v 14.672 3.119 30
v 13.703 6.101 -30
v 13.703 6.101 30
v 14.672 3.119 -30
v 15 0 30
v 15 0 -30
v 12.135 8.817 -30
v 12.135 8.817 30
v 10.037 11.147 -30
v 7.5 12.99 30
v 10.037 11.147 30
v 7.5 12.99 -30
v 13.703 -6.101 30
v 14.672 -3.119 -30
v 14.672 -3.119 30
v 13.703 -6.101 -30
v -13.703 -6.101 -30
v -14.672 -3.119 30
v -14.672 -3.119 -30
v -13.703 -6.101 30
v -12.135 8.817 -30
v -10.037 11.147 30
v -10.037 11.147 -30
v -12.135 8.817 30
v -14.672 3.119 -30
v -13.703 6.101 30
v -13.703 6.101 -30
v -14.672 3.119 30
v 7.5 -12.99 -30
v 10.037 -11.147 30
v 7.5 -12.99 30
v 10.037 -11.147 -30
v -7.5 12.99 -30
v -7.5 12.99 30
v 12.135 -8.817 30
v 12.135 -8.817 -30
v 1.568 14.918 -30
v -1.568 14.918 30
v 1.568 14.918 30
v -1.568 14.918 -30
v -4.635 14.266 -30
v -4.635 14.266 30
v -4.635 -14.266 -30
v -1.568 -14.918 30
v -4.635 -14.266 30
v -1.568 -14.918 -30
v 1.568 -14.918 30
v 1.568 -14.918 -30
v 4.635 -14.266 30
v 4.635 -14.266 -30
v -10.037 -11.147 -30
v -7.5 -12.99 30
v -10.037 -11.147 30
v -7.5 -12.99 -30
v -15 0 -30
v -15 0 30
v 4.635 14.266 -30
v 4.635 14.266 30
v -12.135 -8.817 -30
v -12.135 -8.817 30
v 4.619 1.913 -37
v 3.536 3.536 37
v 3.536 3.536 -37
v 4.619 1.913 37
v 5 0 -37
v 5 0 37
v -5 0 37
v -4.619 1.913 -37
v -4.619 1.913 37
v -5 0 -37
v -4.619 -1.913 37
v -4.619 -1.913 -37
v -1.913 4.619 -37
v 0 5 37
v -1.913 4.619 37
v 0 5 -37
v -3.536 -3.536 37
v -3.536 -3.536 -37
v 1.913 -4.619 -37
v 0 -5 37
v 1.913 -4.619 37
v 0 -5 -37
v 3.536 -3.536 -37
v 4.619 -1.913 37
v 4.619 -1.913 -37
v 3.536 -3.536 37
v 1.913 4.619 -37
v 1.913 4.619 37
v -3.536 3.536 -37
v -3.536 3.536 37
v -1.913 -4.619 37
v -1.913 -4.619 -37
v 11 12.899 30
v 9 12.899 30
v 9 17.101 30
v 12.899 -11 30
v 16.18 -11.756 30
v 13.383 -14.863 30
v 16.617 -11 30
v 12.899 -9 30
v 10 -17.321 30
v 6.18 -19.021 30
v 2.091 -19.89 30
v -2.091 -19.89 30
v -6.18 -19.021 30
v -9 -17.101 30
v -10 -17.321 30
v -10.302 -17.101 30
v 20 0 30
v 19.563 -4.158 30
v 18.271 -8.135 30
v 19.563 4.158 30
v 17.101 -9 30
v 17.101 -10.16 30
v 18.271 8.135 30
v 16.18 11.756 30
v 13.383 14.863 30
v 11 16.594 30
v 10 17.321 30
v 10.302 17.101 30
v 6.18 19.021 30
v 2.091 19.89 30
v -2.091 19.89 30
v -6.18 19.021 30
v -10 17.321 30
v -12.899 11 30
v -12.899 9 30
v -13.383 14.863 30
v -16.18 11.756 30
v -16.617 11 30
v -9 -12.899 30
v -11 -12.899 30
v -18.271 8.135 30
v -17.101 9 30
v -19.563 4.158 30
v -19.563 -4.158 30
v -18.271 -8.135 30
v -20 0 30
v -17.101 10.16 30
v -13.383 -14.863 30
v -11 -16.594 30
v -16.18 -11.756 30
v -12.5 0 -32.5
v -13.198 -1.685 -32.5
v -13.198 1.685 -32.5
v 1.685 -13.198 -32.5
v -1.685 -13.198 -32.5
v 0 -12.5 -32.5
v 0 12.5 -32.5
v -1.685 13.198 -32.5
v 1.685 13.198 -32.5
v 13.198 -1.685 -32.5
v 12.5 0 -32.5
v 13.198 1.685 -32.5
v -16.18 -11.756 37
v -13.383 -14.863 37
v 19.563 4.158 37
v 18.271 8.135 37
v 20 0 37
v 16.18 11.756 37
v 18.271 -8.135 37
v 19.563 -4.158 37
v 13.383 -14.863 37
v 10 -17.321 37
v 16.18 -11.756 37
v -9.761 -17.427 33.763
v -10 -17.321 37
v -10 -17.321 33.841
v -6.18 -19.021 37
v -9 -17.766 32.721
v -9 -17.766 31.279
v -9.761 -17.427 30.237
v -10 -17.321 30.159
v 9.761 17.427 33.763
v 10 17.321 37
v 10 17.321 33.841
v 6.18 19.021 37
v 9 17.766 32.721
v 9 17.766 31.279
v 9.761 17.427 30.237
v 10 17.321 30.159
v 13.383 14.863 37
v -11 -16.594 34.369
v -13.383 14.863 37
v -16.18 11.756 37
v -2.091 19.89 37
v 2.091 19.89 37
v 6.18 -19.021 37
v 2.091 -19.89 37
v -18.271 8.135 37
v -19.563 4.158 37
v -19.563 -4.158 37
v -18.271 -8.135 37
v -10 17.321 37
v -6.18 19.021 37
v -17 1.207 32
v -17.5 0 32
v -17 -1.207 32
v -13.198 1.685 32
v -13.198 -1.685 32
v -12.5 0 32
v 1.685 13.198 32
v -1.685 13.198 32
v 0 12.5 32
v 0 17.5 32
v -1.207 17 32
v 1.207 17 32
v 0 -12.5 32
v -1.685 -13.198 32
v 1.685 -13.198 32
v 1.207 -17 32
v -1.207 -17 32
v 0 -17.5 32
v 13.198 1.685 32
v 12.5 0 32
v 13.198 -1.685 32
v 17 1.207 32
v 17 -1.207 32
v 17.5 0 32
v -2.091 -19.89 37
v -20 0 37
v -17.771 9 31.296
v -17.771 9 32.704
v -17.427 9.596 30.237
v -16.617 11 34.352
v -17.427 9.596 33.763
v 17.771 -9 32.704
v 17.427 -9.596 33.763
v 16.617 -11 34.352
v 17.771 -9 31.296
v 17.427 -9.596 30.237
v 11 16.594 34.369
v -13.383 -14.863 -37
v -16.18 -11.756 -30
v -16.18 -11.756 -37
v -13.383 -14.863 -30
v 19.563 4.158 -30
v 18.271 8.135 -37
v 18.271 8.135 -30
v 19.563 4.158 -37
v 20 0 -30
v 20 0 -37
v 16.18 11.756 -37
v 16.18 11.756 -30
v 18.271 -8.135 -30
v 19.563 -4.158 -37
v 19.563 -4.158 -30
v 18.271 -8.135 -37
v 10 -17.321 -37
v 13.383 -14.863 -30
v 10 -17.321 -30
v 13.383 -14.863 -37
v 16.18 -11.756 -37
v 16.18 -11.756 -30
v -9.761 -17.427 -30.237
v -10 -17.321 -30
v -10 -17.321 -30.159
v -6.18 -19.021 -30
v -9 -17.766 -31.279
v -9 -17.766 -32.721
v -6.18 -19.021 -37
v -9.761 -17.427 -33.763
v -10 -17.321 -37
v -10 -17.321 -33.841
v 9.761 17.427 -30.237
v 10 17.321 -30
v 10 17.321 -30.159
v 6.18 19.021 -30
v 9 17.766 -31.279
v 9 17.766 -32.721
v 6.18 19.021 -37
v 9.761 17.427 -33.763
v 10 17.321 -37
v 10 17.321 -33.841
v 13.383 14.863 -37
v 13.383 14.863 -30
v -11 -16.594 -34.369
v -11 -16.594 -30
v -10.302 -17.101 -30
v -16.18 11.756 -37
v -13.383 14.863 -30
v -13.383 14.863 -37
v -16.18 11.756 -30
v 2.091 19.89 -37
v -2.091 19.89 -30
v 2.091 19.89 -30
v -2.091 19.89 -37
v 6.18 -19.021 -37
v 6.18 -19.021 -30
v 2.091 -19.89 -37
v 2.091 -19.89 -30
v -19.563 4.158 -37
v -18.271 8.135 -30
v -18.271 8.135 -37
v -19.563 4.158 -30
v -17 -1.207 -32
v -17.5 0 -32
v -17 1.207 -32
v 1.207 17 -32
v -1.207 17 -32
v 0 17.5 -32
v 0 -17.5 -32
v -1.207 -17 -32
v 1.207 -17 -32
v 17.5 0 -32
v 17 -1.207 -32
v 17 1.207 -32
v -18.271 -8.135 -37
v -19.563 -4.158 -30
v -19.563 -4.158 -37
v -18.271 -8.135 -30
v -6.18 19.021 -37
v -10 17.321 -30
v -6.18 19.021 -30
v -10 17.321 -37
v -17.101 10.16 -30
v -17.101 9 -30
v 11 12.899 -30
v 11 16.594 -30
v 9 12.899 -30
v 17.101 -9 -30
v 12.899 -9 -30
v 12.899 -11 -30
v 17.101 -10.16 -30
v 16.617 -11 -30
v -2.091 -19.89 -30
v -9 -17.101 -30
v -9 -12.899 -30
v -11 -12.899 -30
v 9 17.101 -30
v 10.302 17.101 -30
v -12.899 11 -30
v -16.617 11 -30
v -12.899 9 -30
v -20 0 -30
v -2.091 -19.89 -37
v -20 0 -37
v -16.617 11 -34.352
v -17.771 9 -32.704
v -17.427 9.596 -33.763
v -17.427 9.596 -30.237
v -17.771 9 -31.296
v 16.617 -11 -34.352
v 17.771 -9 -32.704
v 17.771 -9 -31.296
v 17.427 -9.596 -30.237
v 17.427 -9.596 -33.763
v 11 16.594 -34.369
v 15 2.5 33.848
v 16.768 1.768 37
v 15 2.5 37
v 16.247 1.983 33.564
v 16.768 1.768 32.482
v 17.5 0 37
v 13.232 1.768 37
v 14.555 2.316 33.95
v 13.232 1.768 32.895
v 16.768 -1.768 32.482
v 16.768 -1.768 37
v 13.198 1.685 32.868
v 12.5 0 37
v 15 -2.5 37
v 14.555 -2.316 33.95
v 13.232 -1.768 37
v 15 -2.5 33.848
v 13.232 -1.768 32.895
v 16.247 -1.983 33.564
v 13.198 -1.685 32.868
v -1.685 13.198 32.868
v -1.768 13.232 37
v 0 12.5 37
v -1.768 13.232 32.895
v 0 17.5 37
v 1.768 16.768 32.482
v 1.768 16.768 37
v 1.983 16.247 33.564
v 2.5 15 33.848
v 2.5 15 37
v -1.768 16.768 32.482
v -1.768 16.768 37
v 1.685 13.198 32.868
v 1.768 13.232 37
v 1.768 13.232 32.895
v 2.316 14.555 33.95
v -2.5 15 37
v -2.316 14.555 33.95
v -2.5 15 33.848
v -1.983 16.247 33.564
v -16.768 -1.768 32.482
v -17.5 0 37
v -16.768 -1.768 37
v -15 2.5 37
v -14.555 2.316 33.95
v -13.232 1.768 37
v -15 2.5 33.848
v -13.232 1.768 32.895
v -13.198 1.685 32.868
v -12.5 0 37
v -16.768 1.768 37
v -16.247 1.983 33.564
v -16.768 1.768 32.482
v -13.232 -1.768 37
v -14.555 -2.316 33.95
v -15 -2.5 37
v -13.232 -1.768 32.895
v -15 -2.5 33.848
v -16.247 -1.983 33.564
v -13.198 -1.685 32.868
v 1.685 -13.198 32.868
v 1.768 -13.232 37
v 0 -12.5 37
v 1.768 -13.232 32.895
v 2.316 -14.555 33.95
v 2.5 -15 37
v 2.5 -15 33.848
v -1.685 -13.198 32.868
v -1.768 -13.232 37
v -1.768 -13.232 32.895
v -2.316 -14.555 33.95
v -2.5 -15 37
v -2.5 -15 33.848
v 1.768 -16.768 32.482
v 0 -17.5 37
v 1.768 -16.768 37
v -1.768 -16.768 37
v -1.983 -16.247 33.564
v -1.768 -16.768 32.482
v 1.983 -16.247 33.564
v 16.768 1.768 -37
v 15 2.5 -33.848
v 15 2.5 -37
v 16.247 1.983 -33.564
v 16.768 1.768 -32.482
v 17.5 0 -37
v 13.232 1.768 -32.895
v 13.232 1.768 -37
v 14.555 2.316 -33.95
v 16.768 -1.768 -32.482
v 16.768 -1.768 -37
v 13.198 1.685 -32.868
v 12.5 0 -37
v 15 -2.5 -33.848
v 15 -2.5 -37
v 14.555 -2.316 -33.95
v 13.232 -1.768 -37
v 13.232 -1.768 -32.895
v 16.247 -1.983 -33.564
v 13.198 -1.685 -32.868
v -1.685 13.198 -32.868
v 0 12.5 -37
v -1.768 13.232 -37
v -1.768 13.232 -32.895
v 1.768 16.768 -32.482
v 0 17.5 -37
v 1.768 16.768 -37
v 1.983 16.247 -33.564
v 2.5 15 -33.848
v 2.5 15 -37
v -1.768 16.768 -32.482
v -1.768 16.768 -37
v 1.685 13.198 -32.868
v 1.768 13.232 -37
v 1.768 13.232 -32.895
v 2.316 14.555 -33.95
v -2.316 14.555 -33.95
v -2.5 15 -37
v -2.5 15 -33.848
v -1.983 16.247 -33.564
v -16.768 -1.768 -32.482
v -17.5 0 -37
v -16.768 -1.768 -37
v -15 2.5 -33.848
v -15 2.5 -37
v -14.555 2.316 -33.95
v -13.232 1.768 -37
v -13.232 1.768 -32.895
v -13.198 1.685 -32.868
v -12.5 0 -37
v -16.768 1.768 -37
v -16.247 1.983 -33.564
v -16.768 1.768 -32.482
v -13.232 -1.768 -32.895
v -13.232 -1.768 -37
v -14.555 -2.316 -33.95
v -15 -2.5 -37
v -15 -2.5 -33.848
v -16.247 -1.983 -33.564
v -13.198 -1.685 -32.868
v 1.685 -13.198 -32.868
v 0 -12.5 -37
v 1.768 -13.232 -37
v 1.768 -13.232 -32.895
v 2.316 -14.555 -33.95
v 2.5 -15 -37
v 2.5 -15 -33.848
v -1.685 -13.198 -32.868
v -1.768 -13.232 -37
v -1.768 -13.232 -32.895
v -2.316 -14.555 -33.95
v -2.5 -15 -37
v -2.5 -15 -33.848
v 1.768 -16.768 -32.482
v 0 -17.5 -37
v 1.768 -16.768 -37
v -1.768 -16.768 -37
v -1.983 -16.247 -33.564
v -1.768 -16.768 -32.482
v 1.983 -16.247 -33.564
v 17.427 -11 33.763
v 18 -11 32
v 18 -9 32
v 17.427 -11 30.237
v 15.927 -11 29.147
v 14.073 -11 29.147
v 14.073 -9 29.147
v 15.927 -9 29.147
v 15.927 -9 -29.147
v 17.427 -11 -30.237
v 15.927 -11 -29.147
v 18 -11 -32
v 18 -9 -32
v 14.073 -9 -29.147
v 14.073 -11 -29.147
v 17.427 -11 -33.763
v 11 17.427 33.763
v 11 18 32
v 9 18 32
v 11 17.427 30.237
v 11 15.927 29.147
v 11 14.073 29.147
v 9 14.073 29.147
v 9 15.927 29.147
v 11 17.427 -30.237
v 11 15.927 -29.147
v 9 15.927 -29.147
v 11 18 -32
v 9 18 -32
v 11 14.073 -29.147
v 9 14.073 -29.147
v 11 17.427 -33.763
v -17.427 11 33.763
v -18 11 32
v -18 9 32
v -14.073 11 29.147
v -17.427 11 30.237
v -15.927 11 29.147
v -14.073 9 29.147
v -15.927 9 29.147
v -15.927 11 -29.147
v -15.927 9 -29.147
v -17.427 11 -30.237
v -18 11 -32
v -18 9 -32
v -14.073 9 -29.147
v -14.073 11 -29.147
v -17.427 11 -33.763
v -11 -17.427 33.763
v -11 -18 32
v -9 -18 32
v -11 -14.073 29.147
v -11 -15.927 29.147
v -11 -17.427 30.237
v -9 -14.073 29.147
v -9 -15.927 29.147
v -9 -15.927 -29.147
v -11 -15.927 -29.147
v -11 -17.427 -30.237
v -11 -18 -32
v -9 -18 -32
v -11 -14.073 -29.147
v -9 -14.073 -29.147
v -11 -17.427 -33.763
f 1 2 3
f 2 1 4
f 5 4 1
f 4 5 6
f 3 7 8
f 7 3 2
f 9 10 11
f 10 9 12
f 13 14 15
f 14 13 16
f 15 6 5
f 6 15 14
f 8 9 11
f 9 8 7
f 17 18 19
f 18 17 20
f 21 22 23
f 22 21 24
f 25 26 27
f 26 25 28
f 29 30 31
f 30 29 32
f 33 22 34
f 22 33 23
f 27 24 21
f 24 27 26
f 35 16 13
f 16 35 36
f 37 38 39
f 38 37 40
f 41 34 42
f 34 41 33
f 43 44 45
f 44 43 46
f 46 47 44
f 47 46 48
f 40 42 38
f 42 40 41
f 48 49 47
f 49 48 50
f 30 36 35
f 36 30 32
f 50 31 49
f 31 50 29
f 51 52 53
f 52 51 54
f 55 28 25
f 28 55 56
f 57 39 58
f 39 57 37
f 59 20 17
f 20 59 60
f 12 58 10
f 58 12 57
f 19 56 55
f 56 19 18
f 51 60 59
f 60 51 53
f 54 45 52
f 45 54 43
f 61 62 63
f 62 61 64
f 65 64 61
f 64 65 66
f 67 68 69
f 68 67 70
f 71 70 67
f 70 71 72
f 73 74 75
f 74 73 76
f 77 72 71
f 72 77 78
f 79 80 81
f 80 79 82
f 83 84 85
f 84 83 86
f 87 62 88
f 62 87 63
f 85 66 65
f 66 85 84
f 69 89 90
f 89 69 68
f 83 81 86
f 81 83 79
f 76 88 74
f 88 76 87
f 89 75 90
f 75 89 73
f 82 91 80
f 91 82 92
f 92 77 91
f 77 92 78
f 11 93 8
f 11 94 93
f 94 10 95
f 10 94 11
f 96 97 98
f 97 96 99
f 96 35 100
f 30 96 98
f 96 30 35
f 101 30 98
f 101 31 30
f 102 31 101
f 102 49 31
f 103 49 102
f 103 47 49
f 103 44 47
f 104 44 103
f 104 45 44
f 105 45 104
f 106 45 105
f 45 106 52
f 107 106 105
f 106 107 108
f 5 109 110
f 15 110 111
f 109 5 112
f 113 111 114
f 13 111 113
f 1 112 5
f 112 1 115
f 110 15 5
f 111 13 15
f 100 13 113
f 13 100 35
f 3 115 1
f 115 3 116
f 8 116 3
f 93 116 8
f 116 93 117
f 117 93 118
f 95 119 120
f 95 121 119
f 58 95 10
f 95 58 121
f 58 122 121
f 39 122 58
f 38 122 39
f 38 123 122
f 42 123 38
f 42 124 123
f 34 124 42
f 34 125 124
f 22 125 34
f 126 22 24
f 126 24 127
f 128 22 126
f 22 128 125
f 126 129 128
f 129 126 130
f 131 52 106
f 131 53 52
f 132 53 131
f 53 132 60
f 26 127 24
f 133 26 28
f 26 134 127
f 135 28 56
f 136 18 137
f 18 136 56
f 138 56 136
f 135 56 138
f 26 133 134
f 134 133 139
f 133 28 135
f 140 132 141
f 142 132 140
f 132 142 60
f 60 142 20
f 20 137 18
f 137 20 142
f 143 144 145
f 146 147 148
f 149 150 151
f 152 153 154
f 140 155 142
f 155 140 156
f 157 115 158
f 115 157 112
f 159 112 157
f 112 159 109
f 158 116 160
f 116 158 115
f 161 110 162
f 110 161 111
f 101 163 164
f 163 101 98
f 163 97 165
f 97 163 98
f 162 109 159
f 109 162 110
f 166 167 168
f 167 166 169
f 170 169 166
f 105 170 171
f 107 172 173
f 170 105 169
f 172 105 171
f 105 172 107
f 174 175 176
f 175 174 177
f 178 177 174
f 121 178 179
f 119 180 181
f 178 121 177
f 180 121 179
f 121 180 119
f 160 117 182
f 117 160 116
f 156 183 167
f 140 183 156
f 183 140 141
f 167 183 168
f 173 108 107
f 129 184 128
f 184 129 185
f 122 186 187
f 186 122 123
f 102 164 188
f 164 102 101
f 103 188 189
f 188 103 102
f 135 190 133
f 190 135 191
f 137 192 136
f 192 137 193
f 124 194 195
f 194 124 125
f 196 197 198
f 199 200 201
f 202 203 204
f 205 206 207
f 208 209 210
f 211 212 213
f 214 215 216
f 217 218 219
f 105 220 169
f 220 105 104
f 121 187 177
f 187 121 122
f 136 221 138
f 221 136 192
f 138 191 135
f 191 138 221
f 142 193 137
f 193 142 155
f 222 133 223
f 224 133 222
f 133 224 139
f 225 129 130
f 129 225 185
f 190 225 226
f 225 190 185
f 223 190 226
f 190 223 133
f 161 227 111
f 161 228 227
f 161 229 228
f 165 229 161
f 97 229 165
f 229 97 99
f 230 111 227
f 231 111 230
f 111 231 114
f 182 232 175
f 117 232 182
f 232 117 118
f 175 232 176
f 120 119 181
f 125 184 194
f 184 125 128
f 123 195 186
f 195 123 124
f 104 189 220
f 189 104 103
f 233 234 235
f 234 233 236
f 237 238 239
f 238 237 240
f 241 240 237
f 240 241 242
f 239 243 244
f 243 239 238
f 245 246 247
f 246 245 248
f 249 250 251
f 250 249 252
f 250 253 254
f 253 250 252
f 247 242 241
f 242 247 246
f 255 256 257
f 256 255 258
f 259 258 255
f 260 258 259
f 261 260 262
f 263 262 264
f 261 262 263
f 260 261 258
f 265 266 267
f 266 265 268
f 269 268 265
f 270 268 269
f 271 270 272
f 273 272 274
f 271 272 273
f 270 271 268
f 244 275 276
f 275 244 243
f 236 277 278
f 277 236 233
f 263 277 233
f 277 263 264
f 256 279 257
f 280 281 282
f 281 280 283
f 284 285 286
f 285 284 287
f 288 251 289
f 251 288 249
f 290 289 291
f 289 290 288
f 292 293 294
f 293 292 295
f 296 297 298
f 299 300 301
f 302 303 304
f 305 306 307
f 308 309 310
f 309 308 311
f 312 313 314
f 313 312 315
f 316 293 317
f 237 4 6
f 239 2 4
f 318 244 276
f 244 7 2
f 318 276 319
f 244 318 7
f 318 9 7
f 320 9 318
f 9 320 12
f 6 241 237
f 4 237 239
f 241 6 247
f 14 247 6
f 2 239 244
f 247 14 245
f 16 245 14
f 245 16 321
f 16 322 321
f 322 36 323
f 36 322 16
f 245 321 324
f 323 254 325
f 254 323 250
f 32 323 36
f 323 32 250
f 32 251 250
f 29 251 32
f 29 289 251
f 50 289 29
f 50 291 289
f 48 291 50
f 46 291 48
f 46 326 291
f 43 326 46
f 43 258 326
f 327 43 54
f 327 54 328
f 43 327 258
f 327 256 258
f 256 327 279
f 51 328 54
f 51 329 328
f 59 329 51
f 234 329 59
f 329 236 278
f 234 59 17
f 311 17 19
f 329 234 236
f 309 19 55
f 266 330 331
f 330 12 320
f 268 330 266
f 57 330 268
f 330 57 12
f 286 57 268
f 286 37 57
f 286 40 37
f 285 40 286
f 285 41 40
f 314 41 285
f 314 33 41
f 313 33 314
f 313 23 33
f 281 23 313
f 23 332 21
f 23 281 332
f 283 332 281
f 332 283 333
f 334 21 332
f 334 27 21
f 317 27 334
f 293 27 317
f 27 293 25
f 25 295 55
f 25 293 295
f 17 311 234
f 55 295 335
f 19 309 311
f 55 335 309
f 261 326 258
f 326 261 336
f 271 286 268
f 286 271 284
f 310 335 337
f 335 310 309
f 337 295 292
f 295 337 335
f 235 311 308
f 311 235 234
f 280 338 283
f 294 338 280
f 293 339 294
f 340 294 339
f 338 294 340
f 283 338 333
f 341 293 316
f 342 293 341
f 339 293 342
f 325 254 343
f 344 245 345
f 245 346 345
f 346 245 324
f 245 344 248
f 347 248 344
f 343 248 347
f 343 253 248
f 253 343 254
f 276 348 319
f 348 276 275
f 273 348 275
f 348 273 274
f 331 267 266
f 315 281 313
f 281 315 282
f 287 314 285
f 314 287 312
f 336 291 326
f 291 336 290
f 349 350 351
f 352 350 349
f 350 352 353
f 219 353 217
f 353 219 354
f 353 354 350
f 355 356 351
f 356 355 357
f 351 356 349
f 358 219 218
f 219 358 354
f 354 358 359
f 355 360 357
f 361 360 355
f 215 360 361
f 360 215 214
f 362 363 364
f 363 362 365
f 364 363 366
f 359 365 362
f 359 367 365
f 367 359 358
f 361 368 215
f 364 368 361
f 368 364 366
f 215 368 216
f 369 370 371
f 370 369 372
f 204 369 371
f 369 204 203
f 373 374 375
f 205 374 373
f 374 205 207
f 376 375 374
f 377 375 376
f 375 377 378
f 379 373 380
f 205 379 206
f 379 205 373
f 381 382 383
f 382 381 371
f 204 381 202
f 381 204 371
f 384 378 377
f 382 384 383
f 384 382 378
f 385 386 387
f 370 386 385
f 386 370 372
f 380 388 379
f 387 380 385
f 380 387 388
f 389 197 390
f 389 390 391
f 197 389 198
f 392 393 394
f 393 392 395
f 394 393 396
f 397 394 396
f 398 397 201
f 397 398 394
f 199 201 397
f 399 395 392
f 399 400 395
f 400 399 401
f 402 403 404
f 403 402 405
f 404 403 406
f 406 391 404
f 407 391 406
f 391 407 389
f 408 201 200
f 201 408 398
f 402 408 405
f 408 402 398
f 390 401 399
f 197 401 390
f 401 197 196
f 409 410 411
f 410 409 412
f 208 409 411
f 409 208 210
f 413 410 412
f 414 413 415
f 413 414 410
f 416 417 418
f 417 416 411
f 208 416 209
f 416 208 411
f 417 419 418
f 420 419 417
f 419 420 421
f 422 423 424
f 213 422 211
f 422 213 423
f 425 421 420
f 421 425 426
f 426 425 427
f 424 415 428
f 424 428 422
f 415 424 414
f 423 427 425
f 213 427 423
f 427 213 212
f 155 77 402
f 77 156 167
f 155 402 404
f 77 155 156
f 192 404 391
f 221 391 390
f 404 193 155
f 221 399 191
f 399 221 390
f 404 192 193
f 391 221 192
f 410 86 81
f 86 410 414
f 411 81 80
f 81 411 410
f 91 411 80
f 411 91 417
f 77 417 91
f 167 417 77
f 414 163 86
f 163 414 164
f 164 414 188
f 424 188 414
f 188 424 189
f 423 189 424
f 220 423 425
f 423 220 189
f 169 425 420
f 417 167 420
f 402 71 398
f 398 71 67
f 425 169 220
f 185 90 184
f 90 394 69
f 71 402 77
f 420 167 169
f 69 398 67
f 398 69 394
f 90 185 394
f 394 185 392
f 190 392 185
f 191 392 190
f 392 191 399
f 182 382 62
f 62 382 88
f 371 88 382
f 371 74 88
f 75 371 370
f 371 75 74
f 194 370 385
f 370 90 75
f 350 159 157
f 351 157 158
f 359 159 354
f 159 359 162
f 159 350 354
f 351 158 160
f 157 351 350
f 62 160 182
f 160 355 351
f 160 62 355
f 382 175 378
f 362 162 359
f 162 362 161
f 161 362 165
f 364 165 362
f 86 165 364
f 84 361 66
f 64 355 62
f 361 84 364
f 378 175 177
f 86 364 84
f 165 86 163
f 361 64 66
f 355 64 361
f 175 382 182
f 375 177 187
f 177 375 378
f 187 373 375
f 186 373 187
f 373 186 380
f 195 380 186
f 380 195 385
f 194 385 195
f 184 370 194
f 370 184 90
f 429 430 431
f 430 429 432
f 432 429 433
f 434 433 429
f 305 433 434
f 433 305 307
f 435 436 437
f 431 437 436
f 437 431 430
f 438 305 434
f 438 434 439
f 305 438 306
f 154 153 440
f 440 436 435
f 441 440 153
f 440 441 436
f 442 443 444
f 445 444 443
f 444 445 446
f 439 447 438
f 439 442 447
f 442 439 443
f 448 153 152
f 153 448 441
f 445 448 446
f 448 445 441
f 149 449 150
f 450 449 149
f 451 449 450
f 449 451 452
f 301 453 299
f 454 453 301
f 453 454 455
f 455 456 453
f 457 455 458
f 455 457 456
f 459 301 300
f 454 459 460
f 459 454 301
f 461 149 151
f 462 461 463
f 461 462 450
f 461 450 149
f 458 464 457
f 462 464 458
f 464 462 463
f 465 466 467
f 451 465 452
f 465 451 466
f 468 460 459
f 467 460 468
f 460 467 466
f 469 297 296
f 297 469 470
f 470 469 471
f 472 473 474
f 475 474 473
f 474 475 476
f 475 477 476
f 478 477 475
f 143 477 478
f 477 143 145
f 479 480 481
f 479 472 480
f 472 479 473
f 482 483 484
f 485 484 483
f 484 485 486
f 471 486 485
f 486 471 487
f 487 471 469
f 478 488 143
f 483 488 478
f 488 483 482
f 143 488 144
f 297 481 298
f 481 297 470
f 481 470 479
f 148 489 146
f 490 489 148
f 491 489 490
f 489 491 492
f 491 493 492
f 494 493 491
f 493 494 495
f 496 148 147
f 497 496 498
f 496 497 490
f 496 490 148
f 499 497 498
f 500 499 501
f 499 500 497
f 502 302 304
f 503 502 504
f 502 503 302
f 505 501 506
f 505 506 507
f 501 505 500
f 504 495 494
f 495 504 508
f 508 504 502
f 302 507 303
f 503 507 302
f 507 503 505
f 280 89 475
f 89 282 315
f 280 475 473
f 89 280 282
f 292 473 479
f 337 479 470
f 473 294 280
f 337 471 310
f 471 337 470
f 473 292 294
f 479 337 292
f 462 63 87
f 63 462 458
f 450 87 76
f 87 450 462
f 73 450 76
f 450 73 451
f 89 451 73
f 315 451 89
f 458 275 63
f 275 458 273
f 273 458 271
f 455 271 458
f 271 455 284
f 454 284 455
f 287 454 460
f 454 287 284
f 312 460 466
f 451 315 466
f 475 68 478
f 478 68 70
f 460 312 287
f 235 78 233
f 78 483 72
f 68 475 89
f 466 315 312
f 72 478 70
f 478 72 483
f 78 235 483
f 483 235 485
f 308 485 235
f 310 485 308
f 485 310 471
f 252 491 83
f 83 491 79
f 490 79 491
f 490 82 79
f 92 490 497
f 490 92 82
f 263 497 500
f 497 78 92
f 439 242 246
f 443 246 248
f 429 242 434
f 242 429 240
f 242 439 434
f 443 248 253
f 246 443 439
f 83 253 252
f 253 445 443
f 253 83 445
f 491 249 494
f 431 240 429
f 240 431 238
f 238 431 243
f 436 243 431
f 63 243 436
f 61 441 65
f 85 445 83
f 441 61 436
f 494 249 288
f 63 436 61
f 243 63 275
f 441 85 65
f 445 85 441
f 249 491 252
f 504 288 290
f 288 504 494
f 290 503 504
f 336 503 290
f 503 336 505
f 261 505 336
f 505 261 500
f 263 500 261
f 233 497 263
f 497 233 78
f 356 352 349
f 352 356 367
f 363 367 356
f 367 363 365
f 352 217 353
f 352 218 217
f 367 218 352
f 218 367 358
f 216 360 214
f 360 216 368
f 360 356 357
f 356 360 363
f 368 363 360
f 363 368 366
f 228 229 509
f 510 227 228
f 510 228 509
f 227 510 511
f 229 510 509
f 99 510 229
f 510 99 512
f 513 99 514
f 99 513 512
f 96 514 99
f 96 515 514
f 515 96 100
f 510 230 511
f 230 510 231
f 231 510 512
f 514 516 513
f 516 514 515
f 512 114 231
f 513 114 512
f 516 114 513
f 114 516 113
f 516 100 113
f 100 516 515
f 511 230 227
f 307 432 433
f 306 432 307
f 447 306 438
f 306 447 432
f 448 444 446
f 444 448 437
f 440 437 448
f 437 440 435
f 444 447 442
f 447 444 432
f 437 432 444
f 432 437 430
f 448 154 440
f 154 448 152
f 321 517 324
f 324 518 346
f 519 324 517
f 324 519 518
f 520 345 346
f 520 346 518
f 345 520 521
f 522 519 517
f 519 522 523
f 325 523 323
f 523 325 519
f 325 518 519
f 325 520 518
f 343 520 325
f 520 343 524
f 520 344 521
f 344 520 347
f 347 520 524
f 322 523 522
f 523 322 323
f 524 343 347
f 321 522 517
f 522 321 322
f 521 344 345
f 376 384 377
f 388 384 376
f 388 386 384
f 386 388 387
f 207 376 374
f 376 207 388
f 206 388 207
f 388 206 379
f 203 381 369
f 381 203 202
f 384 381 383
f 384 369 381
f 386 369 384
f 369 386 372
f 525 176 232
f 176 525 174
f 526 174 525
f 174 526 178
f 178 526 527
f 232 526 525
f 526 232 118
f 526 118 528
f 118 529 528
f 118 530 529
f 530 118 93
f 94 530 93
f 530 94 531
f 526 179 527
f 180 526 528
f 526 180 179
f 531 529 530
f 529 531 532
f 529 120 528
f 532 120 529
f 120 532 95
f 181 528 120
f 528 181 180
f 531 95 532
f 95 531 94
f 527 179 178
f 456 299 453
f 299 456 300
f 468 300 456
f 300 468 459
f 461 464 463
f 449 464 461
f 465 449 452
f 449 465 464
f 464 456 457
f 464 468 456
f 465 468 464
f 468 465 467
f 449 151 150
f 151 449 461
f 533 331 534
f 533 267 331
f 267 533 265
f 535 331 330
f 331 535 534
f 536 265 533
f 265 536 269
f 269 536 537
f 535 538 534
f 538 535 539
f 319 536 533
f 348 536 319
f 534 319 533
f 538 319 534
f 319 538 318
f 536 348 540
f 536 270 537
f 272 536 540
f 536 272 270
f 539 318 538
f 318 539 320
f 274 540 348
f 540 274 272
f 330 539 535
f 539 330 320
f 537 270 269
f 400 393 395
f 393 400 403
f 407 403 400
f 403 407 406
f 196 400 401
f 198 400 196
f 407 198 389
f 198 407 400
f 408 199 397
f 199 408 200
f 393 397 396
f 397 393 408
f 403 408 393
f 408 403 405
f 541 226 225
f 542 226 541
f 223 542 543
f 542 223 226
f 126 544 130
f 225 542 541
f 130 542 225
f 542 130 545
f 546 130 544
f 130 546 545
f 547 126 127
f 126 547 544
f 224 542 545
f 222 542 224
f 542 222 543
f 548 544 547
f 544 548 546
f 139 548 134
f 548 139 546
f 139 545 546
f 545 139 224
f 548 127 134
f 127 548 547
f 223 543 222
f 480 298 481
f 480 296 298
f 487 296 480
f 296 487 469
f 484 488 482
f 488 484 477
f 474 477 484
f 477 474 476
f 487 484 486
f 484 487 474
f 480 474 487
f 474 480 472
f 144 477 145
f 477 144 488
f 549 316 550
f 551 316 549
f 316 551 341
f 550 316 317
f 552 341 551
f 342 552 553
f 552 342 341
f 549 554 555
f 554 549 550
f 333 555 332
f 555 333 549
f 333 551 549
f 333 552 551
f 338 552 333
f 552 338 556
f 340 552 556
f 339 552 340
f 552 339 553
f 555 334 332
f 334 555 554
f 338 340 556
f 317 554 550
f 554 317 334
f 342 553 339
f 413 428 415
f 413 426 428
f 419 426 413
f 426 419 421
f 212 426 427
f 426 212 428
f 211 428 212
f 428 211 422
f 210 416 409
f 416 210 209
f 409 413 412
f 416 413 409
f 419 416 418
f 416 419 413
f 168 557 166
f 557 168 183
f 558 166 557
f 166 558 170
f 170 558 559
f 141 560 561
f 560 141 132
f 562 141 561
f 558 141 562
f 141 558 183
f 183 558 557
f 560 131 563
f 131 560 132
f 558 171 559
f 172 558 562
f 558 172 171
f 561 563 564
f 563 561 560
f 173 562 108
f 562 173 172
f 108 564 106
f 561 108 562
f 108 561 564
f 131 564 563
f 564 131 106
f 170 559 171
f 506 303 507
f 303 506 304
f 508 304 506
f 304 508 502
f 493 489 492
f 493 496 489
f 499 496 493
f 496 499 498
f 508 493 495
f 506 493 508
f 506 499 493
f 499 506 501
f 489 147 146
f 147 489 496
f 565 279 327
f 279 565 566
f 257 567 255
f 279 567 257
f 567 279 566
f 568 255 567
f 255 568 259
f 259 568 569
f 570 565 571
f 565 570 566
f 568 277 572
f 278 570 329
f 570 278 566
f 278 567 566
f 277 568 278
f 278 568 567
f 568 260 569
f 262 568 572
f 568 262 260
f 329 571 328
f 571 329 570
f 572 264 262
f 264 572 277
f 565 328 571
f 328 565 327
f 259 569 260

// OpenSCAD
// Parameters
shaft_diameter = 10;
central_craft_diameter = 30;
central_craft_length = 50;
flange_diameter = 40;
flange_thickness = 5;
spacer_thickness = 2;
bolt_hole_diameter = 5;
bolt_diameter = 4;
bolt_length = 20;
num_bolts = 4;
bolt_circle_radius = 15;

// Function to create a flange plate
module flange_plate() {
    difference() {
        cylinder(d=flange_diameter, h=flange_thickness, center=true);
        cylinder(d=shaft_diameter, h=flange_thickness + 1, center=true);
        for (i = [0:num_bolts-1]) {
            angle = i * 360 / num_bolts;
            translate([bolt_circle_radius * cos(angle), bolt_circle_radius * sin(angle), 0])
                cylinder(d=bolt_hole_diameter, h=flange_thickness + 1, center=true);
        }
    }
}

// Function to create a spacer ring
module spacer_ring() {
    difference() {
        cylinder(d=flange_diameter, h=spacer_thickness, center=true);
        cylinder(d=shaft_diameter, h=spacer_thickness + 1, center=true);
    }
}

// Function to create a bolt with a nut
module bolt_with_nut() {
    union() {
        cylinder(d=bolt_diameter, h=bolt_length, center=true);
        translate([0, 0, bolt_length / 2])
            cylinder(d=bolt_diameter * 1.5, h=bolt_diameter / 2, center=true);
    }
}

// Function to create the central craft
module central_craft() {
    difference() {
        cylinder(d=central_craft_diameter, h=central_craft_length, center=true);
        cylinder(d=shaft_diameter, h=central_craft_length + 1, center=true);
    }
}

// Function to create the input and output crafts
module input_output_craft() {
    difference() {
        union() {
            cylinder(d=central_craft_diameter, h=flange_thickness, center=true);
            translate([0, 0, -flange_thickness / 2])
                cylinder(d=central_craft_diameter, h=flange_thickness, center=true);
        }
        cylinder(d=shaft_diameter, h=flange_thickness * 2 + 1, center=true);
    }
}

// Assembly
module flexible_coupling() {
    central_craft();
    
    translate([0, 0, central_craft_length / 2 + flange_thickness / 2])
        input_output_craft();
    
    translate([0, 0, -central_craft_length / 2 - flange_thickness / 2])
        input_output_craft();
    
    translate([0, 0, central_craft_length / 2 + flange_thickness + spacer_thickness / 2])
        spacer_ring();
    
    translate([0, 0, -central_craft_length / 2 - flange_thickness - spacer_thickness / 2])
        spacer_ring();
    
    translate([0, 0, central_craft_length / 2 + flange_thickness + spacer_thickness + flange_thickness / 2])
        flange_plate();
    
    translate([0, 0, -central_craft_length / 2 - flange_thickness - spacer_thickness - flange_thickness / 2])
        flange_plate();
    
    for (i = [0:num_bolts-1]) {
        angle = i * 360 / num_bolts;
        translate([bolt_circle_radius * cos(angle), bolt_circle_radius * sin(angle), central_craft_length / 2 + flange_thickness + spacer_thickness])
            rotate([90, 0, angle])
                bolt_with_nut();
        
        translate([bolt_circle_radius * cos(angle), bolt_circle_radius * sin(angle), -central_craft_length / 2 - flange_thickness - spacer_thickness])
            rotate([90, 0, angle])
                bolt_with_nut();
    }
}

// Render the model
flexible_coupling();
